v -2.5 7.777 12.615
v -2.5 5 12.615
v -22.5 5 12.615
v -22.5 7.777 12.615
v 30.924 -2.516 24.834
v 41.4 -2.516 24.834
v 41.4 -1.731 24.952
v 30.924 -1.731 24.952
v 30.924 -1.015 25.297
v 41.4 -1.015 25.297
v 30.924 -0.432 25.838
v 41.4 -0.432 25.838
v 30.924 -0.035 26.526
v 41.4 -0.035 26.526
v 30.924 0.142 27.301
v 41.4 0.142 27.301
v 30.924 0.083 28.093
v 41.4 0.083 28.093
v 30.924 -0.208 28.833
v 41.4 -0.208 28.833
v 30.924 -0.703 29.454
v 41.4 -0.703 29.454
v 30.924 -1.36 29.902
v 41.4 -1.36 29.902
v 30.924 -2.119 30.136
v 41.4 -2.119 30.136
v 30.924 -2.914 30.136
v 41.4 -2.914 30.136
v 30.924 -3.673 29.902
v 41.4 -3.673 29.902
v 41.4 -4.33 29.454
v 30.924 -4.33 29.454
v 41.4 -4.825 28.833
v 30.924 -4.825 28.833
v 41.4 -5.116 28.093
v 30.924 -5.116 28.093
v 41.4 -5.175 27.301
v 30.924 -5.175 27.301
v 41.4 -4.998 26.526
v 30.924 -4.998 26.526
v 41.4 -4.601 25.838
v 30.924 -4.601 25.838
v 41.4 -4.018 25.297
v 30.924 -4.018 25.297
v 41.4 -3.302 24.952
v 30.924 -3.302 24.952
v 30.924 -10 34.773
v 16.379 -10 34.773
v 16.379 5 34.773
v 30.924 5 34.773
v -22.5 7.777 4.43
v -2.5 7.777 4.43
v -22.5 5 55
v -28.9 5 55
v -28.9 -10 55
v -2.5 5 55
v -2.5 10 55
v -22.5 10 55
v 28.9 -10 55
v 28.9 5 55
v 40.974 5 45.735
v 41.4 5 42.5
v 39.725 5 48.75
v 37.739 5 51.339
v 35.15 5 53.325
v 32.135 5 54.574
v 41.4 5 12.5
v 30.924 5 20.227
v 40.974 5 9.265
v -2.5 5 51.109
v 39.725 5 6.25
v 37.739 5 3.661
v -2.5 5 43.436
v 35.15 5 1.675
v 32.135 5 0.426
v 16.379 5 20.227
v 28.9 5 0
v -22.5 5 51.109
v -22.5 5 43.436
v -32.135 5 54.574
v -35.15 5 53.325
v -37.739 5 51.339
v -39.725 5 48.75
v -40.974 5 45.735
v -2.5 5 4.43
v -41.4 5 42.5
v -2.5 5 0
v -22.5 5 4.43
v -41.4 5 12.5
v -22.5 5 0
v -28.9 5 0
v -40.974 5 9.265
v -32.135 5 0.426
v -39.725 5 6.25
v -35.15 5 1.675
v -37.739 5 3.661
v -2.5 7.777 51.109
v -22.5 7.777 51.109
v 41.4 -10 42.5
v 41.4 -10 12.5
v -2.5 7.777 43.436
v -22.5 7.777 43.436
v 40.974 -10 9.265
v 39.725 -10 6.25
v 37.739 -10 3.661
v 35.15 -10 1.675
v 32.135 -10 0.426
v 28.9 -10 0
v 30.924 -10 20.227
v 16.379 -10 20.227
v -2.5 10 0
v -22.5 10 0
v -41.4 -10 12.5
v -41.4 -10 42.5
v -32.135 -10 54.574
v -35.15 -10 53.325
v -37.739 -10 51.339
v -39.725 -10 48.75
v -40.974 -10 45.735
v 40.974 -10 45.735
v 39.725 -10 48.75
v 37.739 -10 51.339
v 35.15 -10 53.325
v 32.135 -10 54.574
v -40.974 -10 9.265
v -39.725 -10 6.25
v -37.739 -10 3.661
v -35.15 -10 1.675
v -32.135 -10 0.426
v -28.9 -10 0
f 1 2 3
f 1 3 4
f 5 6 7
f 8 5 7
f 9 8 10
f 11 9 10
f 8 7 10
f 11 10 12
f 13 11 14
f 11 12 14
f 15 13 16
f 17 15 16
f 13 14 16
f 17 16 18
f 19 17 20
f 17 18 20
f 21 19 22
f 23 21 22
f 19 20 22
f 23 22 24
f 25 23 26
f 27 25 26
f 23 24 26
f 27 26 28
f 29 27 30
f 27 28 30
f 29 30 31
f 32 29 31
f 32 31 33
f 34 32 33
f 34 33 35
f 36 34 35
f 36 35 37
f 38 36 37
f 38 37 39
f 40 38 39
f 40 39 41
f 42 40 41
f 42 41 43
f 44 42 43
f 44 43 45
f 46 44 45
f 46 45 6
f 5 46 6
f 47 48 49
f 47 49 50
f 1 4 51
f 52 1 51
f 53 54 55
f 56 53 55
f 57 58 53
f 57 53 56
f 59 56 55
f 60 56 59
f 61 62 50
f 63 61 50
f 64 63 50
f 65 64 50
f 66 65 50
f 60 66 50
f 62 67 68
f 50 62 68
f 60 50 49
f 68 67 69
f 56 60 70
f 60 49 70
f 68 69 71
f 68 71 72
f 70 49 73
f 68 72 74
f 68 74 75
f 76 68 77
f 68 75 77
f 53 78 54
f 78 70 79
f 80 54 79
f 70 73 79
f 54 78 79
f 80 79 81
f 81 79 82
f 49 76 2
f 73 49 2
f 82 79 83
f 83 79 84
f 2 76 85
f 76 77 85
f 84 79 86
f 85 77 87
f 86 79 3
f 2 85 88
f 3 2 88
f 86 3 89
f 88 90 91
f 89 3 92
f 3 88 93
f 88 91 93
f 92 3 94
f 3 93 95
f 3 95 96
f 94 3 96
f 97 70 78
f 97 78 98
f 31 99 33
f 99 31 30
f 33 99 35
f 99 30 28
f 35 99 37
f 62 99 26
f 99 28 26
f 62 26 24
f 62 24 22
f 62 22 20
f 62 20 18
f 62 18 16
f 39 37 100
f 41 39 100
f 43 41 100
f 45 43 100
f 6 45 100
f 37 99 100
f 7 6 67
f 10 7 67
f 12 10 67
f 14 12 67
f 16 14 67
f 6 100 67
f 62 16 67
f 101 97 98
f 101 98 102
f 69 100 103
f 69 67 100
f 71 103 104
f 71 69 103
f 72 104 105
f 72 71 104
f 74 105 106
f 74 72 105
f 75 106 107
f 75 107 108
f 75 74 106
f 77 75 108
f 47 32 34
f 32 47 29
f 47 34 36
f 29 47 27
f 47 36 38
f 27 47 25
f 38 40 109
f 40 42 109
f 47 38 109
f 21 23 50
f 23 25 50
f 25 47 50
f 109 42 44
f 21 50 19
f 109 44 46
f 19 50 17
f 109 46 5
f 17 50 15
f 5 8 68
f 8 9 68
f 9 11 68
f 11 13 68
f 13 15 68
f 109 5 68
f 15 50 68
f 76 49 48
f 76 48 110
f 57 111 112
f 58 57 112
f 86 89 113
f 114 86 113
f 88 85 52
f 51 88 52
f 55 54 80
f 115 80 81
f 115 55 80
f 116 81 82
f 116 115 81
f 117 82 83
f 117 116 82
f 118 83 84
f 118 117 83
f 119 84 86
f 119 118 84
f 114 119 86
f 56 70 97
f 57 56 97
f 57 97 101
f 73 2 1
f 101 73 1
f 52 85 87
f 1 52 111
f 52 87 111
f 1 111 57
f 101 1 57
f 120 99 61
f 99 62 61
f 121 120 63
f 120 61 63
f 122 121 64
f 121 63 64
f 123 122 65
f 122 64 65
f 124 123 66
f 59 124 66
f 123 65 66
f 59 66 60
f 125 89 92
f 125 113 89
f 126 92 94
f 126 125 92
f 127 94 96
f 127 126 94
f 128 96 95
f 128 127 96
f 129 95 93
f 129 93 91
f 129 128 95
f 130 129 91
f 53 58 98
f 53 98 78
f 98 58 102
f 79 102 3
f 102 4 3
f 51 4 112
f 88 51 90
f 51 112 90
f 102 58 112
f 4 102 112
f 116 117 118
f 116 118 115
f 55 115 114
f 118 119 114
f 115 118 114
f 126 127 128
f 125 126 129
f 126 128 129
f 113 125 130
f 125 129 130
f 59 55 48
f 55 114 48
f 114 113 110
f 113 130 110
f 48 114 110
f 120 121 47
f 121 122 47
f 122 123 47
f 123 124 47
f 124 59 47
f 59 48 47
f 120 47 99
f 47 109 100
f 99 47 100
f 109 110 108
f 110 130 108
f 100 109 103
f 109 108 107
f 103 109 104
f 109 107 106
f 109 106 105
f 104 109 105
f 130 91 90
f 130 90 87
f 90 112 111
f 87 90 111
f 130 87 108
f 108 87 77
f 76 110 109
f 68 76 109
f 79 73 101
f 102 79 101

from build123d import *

# Parameters (mm, degrees)
BOSS_EXTRUDE1_DEPTH = 55
SKETCH2_W           = 14.545162339
SKETCH2_H           = 14.545162338
CUT_EXTRUDE1_DEPTH  = 55
SKETCH3_W           = 7.673243051
SKETCH3_H           = 2.777107306
SKETCH3_W_2         = 8.184792588
CUT_EXTRUDE2_DEPTH  = 55
SKETCH4_R           = 2.665972182
CUT_EXTRUDE3_DEPTH  = 20
FILLET1_R           = 12.5


with BuildPart() as part:
    # Sketch1 → Boss-Extrude1 (new body)
    with BuildSketch(Plane.XY):
        Polygon((41.400095641, 5), (28.900095641, 5), (-2.499905164, 5), (-2.499905164, 10), (-22.499903554, 10), (-22.499903554, 5), (-28.900095641, 5), (-41.400095641, 5), (-41.400095641, -10), (-28.900095641, -10), (28.900095641, -10), (41.400095641, -10), align=None)
    extrude(amount=BOSS_EXTRUDE1_DEPTH)

    # Sketch2 → Cut-Extrude1 (cut)
    with BuildSketch(Plane(origin=(0, 5, 0), x_dir=(1, 0, 0), z_dir=(0, 1, 0))):
        with Locations((23.65160359, -27.5)):
            Rectangle(SKETCH2_W, SKETCH2_H)
    extrude(amount=-CUT_EXTRUDE1_DEPTH, mode=Mode.SUBTRACT)

    # Sketch3 → Cut-Extrude2 (cut)
    with BuildSketch(Plane(origin=(-2.499905164, 0, 0), x_dir=(0, 0, -1), z_dir=(1, 0, 0))):
        with Locations((-47.272594324, 6.388553653)):
            Rectangle(SKETCH3_W, SKETCH3_H)
        with Locations((-8.522716918, 6.388553653)):
            Rectangle(SKETCH3_W_2, SKETCH3_H)
    extrude(amount=-CUT_EXTRUDE2_DEPTH, mode=Mode.SUBTRACT)

    # Sketch4 → Cut-Extrude3 (cut)
    with BuildSketch(Plane(origin=(41.400095641, 0, 0), x_dir=(0, 0, -1), z_dir=(1, 0, 0))):
        with Locations((-27.5, -2.516392759)):
            Circle(SKETCH4_R)
    extrude(amount=-CUT_EXTRUDE3_DEPTH, mode=Mode.SUBTRACT)

    # Fillet1
    fillet1_edges = [part.edges().sort_by_distance(p)[0] for p in [
        (-41.400095641, -2.5, 0),
        (41.400095641, -2.5, 0),
        (-41.400095641, -2.5, 55),
        (41.400095641, -2.5, 55),
    ]]
    fillet(fillet1_edges, radius=FILLET1_R)


solid = part.part
